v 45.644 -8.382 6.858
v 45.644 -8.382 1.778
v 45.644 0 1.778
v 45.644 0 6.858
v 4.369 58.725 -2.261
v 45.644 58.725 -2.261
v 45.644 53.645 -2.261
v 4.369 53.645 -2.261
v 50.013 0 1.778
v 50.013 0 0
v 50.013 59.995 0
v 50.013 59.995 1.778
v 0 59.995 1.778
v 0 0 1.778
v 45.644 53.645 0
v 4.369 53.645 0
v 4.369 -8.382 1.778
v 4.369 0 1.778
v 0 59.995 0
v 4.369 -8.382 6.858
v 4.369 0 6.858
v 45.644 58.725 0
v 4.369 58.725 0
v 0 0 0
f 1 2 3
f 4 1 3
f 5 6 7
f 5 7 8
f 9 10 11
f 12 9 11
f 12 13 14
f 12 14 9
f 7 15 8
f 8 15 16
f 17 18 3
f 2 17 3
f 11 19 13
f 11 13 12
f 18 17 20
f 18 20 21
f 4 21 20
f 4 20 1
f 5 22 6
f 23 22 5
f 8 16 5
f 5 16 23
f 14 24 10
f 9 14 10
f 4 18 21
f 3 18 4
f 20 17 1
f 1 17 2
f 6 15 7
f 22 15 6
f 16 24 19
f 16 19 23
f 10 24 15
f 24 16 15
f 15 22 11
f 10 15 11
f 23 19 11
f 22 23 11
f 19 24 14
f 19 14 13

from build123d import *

# Parameters (mm, degrees)
SKETCH1_W           = 50.0126
SKETCH1_H           = 59.9948
BOSS_EXTRUDE1_DEPTH = 1.778
SKETCH2_W           = 41.275
SKETCH2_H           = 8.382
BOSS_EXTRUDE2_DEPTH = 5.08
SKETCH3_W           = 41.275
SKETCH3_H           = 5.08
BOSS_EXTRUDE3_DEPTH = 2.2606


with BuildPart() as part:
    # Sketch1 → Boss-Extrude1 (new body)
    with BuildSketch(Plane.XY):
        with Locations((25.0063, 29.9974)):
            Rectangle(SKETCH1_W, SKETCH1_H)
    extrude(amount=BOSS_EXTRUDE1_DEPTH)

    # Sketch3 → Boss-Extrude3 (add)
    with BuildSketch(Plane(origin=(0, 0, 0), x_dir=(-1, 0, 0), z_dir=(0, 0, -1))):
        with Locations((-25.0063, 56.1848)):
            Rectangle(SKETCH3_W, SKETCH3_H)
    extrude(amount=BOSS_EXTRUDE3_DEPTH)


with BuildPart() as body_2:
    # Sketch2 → Boss-Extrude2 (new body)
    with BuildSketch(Plane.XY.offset(1.778)):
        with Locations((25.0063, -4.191)):
            Rectangle(SKETCH2_W, SKETCH2_H)
    extrude(amount=BOSS_EXTRUDE2_DEPTH)


solid = Compound([part.part, body_2.part])
